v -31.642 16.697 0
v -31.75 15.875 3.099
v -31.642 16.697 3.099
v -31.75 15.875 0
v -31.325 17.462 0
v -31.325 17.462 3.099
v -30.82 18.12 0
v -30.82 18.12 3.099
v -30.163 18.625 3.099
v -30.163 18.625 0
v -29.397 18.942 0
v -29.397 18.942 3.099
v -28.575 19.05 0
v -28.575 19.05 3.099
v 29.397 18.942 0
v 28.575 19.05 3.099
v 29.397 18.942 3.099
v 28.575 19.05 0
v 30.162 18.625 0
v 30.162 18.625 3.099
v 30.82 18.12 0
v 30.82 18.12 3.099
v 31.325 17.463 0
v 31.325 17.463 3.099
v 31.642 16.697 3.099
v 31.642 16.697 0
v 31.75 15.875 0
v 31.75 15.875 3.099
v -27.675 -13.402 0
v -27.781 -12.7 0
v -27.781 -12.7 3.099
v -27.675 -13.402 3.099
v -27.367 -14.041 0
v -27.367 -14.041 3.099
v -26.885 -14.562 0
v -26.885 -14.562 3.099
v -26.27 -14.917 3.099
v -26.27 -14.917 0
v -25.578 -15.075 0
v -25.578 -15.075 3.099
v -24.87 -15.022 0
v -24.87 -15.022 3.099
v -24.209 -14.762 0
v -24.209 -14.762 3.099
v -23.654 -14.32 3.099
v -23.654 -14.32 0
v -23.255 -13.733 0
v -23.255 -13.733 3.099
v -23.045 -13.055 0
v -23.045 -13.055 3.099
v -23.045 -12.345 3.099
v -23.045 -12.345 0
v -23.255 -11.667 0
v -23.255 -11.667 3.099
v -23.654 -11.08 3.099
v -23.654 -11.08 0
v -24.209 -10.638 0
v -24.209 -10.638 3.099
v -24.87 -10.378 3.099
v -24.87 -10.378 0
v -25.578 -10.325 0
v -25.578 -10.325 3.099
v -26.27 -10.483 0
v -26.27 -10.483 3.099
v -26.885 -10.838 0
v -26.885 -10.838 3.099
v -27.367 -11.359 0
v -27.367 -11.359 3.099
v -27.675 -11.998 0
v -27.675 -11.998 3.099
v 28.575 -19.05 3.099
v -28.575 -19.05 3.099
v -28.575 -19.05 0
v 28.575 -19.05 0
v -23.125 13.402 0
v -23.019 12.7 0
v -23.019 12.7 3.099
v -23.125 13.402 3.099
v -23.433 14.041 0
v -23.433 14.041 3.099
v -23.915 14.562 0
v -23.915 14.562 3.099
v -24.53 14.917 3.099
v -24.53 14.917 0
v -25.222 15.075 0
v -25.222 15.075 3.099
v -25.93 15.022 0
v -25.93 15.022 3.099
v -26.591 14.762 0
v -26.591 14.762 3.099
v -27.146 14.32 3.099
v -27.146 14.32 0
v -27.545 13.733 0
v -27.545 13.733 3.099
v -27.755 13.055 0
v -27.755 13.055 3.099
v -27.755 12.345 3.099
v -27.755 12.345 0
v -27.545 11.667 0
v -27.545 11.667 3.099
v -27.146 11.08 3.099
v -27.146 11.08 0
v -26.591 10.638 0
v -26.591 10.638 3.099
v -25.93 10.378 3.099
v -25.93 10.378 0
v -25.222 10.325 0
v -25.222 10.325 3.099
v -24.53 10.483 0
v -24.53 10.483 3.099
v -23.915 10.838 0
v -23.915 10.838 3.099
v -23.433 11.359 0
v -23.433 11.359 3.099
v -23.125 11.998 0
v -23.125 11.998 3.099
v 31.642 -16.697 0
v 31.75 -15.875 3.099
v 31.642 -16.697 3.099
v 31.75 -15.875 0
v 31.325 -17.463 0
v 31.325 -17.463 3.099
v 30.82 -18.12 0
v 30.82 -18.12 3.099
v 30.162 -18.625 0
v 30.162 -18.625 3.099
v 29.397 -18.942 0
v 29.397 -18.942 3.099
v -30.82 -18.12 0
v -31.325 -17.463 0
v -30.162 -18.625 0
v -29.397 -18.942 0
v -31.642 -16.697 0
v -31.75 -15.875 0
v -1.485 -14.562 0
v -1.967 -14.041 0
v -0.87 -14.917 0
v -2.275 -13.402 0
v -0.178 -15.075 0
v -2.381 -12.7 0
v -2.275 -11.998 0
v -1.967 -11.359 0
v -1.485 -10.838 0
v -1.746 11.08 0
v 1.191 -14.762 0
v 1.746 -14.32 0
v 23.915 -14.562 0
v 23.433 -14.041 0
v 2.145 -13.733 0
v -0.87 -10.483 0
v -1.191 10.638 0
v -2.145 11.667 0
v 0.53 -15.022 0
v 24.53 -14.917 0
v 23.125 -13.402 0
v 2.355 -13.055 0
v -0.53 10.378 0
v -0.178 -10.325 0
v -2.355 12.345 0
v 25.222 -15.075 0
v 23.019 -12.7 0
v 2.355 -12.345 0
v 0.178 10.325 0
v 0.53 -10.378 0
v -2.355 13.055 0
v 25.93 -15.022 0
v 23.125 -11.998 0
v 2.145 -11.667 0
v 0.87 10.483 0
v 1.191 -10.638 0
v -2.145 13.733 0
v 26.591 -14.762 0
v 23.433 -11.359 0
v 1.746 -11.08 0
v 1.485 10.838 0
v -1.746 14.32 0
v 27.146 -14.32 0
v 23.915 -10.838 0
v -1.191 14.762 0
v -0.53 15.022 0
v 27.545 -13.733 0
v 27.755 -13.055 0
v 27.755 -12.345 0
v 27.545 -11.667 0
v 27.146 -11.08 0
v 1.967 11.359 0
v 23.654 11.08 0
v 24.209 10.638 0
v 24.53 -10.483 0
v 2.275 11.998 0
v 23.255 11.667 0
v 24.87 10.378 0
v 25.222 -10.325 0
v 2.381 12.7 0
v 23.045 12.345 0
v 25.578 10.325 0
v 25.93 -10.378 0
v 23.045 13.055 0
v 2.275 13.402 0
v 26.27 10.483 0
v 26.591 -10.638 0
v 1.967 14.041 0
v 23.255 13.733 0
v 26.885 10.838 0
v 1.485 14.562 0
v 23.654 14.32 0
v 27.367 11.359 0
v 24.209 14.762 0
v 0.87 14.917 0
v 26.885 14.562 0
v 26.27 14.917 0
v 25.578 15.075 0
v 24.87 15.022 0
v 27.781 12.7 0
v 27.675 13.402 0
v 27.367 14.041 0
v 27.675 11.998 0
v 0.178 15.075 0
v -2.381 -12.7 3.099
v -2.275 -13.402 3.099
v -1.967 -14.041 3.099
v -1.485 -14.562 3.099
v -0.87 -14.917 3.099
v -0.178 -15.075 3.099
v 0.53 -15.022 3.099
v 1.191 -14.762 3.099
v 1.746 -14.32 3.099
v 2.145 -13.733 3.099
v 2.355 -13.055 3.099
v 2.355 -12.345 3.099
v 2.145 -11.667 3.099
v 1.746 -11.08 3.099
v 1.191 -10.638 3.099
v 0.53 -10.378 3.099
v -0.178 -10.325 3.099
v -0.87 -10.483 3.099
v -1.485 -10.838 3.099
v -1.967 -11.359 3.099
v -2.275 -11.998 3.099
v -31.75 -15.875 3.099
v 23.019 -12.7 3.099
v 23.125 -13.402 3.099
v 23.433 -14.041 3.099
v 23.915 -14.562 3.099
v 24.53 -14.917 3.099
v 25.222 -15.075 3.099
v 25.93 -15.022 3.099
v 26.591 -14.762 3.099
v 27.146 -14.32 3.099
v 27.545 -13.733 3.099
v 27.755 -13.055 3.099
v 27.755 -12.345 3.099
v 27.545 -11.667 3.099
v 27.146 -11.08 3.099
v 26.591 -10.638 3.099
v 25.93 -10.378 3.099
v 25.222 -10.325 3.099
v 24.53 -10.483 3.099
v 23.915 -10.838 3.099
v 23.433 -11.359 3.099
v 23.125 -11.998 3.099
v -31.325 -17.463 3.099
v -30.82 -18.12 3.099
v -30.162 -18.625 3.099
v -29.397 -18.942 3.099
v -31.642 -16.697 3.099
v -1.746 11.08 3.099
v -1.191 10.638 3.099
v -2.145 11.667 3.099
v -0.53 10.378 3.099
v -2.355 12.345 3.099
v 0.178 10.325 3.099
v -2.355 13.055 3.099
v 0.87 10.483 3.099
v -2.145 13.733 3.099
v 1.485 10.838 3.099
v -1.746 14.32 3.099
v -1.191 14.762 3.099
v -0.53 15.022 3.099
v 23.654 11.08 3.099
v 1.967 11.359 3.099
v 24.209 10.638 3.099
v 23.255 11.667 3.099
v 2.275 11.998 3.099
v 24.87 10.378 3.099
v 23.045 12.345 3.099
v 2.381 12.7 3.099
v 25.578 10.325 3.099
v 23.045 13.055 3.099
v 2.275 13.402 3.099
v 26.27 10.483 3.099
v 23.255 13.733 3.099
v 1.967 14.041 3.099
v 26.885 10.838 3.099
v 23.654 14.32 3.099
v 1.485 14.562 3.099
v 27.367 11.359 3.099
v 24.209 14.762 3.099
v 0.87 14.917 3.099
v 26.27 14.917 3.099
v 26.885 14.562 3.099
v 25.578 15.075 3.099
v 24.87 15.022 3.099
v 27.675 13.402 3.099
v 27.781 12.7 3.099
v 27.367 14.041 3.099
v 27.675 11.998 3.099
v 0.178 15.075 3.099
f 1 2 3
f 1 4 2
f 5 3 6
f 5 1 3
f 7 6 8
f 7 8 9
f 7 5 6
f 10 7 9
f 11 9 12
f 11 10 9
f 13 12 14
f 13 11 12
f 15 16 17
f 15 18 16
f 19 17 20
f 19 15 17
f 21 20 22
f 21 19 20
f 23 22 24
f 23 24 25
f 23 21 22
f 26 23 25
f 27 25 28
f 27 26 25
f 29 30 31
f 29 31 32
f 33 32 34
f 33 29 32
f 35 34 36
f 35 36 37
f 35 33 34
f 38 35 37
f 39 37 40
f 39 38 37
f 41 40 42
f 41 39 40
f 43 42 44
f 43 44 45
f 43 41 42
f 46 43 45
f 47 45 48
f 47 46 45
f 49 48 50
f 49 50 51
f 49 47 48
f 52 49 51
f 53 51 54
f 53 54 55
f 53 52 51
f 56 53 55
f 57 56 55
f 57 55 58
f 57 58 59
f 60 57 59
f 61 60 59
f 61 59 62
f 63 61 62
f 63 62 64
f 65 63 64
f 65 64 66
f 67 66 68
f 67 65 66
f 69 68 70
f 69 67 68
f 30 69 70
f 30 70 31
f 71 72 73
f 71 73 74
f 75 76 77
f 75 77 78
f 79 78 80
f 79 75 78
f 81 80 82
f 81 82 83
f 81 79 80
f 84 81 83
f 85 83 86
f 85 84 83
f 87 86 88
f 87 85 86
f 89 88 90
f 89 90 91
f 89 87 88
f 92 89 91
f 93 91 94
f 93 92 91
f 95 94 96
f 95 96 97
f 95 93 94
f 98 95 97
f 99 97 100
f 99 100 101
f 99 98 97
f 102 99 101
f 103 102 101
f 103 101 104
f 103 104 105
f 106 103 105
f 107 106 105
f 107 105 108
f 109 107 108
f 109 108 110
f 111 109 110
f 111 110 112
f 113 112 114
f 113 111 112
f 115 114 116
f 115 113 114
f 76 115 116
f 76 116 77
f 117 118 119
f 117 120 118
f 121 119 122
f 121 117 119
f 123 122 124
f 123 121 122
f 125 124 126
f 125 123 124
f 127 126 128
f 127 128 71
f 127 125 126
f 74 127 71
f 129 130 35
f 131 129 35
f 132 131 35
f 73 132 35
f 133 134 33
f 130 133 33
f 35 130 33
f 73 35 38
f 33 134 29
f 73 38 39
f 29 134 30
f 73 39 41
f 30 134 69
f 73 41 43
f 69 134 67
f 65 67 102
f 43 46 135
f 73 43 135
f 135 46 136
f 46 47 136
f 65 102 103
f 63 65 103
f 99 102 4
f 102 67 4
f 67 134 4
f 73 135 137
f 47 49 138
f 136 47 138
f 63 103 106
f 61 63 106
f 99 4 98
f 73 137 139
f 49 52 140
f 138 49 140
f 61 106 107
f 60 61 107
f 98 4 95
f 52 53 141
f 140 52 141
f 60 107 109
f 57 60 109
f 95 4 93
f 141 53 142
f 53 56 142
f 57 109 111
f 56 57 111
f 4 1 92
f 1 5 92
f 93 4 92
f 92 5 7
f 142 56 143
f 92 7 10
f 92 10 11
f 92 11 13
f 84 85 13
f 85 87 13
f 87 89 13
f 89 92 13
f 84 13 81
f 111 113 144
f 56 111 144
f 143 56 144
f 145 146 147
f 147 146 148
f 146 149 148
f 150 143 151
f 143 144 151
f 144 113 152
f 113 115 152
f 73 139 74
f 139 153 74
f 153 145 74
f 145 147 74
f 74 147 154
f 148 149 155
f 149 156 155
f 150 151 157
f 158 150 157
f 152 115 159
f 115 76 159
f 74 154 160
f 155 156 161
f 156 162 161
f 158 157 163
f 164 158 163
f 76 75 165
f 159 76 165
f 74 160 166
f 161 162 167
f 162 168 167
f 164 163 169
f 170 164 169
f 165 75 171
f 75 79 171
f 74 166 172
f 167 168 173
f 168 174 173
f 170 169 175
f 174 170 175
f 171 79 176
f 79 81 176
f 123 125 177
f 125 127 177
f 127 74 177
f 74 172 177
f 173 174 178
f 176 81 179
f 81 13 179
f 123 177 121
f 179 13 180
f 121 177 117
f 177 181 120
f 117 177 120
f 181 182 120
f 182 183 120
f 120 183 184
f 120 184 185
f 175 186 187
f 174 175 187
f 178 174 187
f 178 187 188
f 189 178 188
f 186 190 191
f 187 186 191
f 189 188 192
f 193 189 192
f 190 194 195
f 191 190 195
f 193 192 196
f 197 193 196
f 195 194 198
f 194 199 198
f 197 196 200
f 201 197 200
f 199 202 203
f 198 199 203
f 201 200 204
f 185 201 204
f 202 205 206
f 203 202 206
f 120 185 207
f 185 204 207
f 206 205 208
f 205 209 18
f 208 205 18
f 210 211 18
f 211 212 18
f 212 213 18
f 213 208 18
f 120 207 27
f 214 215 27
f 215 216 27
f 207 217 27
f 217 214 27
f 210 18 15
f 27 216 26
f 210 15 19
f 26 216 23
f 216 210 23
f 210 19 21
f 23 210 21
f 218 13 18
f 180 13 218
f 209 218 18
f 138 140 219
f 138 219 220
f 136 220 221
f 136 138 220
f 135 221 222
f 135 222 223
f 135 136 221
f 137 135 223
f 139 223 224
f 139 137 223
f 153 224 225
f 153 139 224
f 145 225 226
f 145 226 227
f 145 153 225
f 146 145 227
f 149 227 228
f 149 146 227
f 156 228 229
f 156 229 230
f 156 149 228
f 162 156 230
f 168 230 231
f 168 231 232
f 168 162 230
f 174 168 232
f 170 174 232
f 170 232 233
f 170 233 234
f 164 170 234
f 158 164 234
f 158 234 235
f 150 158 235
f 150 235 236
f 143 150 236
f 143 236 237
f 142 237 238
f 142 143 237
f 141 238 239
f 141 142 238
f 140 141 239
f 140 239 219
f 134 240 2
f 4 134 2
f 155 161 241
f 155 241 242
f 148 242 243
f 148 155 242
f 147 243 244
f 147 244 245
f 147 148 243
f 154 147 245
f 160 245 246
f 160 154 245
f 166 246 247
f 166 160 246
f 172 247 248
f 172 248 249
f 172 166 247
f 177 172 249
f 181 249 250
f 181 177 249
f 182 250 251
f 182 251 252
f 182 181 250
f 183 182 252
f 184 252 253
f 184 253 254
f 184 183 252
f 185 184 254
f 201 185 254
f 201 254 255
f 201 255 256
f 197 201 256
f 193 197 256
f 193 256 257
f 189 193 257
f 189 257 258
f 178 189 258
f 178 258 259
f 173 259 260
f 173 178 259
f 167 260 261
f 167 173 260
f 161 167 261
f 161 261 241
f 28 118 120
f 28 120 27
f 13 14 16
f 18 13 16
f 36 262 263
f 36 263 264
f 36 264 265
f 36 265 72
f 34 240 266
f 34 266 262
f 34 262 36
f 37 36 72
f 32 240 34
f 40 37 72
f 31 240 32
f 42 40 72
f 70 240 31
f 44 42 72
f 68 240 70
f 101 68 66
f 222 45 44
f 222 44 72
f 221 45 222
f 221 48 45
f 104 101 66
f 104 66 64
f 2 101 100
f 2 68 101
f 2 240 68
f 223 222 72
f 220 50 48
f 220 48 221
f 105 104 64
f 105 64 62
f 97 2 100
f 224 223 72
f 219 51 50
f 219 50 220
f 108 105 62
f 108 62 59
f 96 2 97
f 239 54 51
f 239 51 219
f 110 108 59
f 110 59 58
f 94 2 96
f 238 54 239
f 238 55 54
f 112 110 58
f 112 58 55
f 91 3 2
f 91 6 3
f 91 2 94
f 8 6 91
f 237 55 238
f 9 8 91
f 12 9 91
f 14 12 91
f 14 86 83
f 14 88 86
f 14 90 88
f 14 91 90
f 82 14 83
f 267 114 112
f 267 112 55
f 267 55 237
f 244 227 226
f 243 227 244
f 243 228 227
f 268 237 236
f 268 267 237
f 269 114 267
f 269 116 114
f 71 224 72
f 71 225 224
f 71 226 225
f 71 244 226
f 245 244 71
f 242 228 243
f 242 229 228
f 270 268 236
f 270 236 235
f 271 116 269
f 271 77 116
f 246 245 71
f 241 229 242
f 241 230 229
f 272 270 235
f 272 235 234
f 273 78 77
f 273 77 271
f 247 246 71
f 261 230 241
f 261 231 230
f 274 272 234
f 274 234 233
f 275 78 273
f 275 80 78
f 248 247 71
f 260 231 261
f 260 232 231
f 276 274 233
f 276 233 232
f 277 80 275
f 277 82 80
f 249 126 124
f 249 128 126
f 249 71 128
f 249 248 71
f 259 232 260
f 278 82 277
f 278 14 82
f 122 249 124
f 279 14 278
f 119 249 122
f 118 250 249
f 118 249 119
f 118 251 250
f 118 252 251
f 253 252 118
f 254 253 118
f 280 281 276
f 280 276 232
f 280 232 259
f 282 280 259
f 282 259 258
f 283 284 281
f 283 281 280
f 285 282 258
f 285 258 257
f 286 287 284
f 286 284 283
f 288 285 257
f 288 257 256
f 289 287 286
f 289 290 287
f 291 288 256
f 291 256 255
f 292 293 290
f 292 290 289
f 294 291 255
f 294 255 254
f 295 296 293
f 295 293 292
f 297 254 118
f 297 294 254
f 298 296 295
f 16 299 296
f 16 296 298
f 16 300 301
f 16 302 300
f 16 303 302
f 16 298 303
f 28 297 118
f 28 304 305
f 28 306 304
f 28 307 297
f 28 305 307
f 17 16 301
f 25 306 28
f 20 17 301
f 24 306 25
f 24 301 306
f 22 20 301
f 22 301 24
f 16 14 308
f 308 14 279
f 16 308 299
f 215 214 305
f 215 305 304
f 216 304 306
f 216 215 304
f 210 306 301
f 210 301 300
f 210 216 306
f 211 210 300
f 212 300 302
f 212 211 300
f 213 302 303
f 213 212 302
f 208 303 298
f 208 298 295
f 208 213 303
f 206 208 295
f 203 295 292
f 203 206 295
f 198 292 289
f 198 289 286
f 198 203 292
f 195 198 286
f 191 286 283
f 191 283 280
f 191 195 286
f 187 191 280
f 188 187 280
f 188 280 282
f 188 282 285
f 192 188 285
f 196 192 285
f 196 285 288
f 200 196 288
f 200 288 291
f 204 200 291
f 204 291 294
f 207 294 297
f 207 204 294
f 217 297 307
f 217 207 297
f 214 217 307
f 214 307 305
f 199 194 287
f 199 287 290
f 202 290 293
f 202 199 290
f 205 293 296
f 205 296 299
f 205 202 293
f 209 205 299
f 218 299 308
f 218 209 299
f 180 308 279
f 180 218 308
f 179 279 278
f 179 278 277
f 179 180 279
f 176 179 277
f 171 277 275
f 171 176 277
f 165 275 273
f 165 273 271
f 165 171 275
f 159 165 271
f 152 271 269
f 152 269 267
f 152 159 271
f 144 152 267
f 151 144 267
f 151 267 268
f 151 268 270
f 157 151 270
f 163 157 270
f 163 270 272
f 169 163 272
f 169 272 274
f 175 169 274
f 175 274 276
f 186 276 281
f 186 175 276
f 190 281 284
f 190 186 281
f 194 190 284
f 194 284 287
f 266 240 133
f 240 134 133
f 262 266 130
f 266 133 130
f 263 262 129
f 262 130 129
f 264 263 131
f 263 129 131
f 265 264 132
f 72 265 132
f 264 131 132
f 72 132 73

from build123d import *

# Parameters (mm, degrees)
SKETCH1_W           = 76.2
SKETCH1_H           = 50.8
SKETCH1_R           = 2.38125
BOSS_EXTRUDE1_DEPTH = 3.0988
FILLET1_R           = 3.175
SKETCH2_W           = 63.5
SKETCH2_H           = 38.1
CUT_EXTRUDE1_DEPTH  = 46.895234627
FILLET3_R           = 3.175


with BuildPart() as part:
    # Sketch1 → Boss-Extrude1 (new body)
    with BuildSketch(Plane.XY):
        Rectangle(SKETCH1_W, SKETCH1_H)
        with Locations((-25.4, 12.7)):
            Circle(SKETCH1_R, mode=Mode.SUBTRACT)
        with Locations((0, 12.7)):
            Circle(SKETCH1_R, mode=Mode.SUBTRACT)
        with Locations((25.4, 12.7)):
            Circle(SKETCH1_R, mode=Mode.SUBTRACT)
        with Locations(Location((25.4, -12.7, 0), (0, 0, 180))):
            Circle(SKETCH1_R, mode=Mode.SUBTRACT)
        with Locations(Location((0, -12.7, 0), (0, 0, 180))):
            Circle(SKETCH1_R, mode=Mode.SUBTRACT)
        with Locations(Location((-25.4, -12.7, 0), (0, 0, 180))):
            Circle(SKETCH1_R, mode=Mode.SUBTRACT)
    extrude(amount=BOSS_EXTRUDE1_DEPTH)

    # Fillet1
    fillet1_edges = [part.edges().sort_by_distance(p)[0] for p in [
        (-38.1, 25.4, 1.5494),
        (38.1, 25.4, 1.5494),
        (38.1, -25.4, 1.5494),
        (-38.1, -25.4, 1.5494),
    ]]
    fillet(fillet1_edges, radius=FILLET1_R)

    # Sketch2 → Cut-Extrude1 (cut, through all)
    with BuildSketch(Plane.XY.offset(3.0988)):
        with BuildLine():
            Line((38.1, -22.225), (38.1, 22.225))
            ThreePointArc((38.1, 22.225), (37.17006403, 24.47006403), (34.925, 25.4))
            Line((34.925, 25.4), (-34.925, 25.4))
            ThreePointArc((-34.925, 25.4), (-37.17006403, 24.47006403), (-38.1, 22.225))
            Line((-38.1, 22.225), (-38.1, -22.225))
            ThreePointArc((-38.1, -22.225), (-37.17006403, -24.47006403), (-34.925, -25.4))
            Line((-34.925, -25.4), (34.925, -25.4))
            ThreePointArc((34.925, -25.4), (37.17006403, -24.47006403), (38.1, -22.225))
        make_face()
        Rectangle(SKETCH2_W, SKETCH2_H, mode=Mode.SUBTRACT)
    extrude(amount=-CUT_EXTRUDE1_DEPTH, mode=Mode.SUBTRACT)

    # Fillet3
    fillet3_edges = [part.edges().sort_by_distance(p)[0] for p in [
        (31.75, -19.05, 1.5494),
        (-31.75, -19.05, 1.5494),
        (-31.75, 19.05, 1.5494),
        (31.75, 19.05, 1.5494),
    ]]
    fillet(fillet3_edges, radius=FILLET3_R)


solid = part.part
